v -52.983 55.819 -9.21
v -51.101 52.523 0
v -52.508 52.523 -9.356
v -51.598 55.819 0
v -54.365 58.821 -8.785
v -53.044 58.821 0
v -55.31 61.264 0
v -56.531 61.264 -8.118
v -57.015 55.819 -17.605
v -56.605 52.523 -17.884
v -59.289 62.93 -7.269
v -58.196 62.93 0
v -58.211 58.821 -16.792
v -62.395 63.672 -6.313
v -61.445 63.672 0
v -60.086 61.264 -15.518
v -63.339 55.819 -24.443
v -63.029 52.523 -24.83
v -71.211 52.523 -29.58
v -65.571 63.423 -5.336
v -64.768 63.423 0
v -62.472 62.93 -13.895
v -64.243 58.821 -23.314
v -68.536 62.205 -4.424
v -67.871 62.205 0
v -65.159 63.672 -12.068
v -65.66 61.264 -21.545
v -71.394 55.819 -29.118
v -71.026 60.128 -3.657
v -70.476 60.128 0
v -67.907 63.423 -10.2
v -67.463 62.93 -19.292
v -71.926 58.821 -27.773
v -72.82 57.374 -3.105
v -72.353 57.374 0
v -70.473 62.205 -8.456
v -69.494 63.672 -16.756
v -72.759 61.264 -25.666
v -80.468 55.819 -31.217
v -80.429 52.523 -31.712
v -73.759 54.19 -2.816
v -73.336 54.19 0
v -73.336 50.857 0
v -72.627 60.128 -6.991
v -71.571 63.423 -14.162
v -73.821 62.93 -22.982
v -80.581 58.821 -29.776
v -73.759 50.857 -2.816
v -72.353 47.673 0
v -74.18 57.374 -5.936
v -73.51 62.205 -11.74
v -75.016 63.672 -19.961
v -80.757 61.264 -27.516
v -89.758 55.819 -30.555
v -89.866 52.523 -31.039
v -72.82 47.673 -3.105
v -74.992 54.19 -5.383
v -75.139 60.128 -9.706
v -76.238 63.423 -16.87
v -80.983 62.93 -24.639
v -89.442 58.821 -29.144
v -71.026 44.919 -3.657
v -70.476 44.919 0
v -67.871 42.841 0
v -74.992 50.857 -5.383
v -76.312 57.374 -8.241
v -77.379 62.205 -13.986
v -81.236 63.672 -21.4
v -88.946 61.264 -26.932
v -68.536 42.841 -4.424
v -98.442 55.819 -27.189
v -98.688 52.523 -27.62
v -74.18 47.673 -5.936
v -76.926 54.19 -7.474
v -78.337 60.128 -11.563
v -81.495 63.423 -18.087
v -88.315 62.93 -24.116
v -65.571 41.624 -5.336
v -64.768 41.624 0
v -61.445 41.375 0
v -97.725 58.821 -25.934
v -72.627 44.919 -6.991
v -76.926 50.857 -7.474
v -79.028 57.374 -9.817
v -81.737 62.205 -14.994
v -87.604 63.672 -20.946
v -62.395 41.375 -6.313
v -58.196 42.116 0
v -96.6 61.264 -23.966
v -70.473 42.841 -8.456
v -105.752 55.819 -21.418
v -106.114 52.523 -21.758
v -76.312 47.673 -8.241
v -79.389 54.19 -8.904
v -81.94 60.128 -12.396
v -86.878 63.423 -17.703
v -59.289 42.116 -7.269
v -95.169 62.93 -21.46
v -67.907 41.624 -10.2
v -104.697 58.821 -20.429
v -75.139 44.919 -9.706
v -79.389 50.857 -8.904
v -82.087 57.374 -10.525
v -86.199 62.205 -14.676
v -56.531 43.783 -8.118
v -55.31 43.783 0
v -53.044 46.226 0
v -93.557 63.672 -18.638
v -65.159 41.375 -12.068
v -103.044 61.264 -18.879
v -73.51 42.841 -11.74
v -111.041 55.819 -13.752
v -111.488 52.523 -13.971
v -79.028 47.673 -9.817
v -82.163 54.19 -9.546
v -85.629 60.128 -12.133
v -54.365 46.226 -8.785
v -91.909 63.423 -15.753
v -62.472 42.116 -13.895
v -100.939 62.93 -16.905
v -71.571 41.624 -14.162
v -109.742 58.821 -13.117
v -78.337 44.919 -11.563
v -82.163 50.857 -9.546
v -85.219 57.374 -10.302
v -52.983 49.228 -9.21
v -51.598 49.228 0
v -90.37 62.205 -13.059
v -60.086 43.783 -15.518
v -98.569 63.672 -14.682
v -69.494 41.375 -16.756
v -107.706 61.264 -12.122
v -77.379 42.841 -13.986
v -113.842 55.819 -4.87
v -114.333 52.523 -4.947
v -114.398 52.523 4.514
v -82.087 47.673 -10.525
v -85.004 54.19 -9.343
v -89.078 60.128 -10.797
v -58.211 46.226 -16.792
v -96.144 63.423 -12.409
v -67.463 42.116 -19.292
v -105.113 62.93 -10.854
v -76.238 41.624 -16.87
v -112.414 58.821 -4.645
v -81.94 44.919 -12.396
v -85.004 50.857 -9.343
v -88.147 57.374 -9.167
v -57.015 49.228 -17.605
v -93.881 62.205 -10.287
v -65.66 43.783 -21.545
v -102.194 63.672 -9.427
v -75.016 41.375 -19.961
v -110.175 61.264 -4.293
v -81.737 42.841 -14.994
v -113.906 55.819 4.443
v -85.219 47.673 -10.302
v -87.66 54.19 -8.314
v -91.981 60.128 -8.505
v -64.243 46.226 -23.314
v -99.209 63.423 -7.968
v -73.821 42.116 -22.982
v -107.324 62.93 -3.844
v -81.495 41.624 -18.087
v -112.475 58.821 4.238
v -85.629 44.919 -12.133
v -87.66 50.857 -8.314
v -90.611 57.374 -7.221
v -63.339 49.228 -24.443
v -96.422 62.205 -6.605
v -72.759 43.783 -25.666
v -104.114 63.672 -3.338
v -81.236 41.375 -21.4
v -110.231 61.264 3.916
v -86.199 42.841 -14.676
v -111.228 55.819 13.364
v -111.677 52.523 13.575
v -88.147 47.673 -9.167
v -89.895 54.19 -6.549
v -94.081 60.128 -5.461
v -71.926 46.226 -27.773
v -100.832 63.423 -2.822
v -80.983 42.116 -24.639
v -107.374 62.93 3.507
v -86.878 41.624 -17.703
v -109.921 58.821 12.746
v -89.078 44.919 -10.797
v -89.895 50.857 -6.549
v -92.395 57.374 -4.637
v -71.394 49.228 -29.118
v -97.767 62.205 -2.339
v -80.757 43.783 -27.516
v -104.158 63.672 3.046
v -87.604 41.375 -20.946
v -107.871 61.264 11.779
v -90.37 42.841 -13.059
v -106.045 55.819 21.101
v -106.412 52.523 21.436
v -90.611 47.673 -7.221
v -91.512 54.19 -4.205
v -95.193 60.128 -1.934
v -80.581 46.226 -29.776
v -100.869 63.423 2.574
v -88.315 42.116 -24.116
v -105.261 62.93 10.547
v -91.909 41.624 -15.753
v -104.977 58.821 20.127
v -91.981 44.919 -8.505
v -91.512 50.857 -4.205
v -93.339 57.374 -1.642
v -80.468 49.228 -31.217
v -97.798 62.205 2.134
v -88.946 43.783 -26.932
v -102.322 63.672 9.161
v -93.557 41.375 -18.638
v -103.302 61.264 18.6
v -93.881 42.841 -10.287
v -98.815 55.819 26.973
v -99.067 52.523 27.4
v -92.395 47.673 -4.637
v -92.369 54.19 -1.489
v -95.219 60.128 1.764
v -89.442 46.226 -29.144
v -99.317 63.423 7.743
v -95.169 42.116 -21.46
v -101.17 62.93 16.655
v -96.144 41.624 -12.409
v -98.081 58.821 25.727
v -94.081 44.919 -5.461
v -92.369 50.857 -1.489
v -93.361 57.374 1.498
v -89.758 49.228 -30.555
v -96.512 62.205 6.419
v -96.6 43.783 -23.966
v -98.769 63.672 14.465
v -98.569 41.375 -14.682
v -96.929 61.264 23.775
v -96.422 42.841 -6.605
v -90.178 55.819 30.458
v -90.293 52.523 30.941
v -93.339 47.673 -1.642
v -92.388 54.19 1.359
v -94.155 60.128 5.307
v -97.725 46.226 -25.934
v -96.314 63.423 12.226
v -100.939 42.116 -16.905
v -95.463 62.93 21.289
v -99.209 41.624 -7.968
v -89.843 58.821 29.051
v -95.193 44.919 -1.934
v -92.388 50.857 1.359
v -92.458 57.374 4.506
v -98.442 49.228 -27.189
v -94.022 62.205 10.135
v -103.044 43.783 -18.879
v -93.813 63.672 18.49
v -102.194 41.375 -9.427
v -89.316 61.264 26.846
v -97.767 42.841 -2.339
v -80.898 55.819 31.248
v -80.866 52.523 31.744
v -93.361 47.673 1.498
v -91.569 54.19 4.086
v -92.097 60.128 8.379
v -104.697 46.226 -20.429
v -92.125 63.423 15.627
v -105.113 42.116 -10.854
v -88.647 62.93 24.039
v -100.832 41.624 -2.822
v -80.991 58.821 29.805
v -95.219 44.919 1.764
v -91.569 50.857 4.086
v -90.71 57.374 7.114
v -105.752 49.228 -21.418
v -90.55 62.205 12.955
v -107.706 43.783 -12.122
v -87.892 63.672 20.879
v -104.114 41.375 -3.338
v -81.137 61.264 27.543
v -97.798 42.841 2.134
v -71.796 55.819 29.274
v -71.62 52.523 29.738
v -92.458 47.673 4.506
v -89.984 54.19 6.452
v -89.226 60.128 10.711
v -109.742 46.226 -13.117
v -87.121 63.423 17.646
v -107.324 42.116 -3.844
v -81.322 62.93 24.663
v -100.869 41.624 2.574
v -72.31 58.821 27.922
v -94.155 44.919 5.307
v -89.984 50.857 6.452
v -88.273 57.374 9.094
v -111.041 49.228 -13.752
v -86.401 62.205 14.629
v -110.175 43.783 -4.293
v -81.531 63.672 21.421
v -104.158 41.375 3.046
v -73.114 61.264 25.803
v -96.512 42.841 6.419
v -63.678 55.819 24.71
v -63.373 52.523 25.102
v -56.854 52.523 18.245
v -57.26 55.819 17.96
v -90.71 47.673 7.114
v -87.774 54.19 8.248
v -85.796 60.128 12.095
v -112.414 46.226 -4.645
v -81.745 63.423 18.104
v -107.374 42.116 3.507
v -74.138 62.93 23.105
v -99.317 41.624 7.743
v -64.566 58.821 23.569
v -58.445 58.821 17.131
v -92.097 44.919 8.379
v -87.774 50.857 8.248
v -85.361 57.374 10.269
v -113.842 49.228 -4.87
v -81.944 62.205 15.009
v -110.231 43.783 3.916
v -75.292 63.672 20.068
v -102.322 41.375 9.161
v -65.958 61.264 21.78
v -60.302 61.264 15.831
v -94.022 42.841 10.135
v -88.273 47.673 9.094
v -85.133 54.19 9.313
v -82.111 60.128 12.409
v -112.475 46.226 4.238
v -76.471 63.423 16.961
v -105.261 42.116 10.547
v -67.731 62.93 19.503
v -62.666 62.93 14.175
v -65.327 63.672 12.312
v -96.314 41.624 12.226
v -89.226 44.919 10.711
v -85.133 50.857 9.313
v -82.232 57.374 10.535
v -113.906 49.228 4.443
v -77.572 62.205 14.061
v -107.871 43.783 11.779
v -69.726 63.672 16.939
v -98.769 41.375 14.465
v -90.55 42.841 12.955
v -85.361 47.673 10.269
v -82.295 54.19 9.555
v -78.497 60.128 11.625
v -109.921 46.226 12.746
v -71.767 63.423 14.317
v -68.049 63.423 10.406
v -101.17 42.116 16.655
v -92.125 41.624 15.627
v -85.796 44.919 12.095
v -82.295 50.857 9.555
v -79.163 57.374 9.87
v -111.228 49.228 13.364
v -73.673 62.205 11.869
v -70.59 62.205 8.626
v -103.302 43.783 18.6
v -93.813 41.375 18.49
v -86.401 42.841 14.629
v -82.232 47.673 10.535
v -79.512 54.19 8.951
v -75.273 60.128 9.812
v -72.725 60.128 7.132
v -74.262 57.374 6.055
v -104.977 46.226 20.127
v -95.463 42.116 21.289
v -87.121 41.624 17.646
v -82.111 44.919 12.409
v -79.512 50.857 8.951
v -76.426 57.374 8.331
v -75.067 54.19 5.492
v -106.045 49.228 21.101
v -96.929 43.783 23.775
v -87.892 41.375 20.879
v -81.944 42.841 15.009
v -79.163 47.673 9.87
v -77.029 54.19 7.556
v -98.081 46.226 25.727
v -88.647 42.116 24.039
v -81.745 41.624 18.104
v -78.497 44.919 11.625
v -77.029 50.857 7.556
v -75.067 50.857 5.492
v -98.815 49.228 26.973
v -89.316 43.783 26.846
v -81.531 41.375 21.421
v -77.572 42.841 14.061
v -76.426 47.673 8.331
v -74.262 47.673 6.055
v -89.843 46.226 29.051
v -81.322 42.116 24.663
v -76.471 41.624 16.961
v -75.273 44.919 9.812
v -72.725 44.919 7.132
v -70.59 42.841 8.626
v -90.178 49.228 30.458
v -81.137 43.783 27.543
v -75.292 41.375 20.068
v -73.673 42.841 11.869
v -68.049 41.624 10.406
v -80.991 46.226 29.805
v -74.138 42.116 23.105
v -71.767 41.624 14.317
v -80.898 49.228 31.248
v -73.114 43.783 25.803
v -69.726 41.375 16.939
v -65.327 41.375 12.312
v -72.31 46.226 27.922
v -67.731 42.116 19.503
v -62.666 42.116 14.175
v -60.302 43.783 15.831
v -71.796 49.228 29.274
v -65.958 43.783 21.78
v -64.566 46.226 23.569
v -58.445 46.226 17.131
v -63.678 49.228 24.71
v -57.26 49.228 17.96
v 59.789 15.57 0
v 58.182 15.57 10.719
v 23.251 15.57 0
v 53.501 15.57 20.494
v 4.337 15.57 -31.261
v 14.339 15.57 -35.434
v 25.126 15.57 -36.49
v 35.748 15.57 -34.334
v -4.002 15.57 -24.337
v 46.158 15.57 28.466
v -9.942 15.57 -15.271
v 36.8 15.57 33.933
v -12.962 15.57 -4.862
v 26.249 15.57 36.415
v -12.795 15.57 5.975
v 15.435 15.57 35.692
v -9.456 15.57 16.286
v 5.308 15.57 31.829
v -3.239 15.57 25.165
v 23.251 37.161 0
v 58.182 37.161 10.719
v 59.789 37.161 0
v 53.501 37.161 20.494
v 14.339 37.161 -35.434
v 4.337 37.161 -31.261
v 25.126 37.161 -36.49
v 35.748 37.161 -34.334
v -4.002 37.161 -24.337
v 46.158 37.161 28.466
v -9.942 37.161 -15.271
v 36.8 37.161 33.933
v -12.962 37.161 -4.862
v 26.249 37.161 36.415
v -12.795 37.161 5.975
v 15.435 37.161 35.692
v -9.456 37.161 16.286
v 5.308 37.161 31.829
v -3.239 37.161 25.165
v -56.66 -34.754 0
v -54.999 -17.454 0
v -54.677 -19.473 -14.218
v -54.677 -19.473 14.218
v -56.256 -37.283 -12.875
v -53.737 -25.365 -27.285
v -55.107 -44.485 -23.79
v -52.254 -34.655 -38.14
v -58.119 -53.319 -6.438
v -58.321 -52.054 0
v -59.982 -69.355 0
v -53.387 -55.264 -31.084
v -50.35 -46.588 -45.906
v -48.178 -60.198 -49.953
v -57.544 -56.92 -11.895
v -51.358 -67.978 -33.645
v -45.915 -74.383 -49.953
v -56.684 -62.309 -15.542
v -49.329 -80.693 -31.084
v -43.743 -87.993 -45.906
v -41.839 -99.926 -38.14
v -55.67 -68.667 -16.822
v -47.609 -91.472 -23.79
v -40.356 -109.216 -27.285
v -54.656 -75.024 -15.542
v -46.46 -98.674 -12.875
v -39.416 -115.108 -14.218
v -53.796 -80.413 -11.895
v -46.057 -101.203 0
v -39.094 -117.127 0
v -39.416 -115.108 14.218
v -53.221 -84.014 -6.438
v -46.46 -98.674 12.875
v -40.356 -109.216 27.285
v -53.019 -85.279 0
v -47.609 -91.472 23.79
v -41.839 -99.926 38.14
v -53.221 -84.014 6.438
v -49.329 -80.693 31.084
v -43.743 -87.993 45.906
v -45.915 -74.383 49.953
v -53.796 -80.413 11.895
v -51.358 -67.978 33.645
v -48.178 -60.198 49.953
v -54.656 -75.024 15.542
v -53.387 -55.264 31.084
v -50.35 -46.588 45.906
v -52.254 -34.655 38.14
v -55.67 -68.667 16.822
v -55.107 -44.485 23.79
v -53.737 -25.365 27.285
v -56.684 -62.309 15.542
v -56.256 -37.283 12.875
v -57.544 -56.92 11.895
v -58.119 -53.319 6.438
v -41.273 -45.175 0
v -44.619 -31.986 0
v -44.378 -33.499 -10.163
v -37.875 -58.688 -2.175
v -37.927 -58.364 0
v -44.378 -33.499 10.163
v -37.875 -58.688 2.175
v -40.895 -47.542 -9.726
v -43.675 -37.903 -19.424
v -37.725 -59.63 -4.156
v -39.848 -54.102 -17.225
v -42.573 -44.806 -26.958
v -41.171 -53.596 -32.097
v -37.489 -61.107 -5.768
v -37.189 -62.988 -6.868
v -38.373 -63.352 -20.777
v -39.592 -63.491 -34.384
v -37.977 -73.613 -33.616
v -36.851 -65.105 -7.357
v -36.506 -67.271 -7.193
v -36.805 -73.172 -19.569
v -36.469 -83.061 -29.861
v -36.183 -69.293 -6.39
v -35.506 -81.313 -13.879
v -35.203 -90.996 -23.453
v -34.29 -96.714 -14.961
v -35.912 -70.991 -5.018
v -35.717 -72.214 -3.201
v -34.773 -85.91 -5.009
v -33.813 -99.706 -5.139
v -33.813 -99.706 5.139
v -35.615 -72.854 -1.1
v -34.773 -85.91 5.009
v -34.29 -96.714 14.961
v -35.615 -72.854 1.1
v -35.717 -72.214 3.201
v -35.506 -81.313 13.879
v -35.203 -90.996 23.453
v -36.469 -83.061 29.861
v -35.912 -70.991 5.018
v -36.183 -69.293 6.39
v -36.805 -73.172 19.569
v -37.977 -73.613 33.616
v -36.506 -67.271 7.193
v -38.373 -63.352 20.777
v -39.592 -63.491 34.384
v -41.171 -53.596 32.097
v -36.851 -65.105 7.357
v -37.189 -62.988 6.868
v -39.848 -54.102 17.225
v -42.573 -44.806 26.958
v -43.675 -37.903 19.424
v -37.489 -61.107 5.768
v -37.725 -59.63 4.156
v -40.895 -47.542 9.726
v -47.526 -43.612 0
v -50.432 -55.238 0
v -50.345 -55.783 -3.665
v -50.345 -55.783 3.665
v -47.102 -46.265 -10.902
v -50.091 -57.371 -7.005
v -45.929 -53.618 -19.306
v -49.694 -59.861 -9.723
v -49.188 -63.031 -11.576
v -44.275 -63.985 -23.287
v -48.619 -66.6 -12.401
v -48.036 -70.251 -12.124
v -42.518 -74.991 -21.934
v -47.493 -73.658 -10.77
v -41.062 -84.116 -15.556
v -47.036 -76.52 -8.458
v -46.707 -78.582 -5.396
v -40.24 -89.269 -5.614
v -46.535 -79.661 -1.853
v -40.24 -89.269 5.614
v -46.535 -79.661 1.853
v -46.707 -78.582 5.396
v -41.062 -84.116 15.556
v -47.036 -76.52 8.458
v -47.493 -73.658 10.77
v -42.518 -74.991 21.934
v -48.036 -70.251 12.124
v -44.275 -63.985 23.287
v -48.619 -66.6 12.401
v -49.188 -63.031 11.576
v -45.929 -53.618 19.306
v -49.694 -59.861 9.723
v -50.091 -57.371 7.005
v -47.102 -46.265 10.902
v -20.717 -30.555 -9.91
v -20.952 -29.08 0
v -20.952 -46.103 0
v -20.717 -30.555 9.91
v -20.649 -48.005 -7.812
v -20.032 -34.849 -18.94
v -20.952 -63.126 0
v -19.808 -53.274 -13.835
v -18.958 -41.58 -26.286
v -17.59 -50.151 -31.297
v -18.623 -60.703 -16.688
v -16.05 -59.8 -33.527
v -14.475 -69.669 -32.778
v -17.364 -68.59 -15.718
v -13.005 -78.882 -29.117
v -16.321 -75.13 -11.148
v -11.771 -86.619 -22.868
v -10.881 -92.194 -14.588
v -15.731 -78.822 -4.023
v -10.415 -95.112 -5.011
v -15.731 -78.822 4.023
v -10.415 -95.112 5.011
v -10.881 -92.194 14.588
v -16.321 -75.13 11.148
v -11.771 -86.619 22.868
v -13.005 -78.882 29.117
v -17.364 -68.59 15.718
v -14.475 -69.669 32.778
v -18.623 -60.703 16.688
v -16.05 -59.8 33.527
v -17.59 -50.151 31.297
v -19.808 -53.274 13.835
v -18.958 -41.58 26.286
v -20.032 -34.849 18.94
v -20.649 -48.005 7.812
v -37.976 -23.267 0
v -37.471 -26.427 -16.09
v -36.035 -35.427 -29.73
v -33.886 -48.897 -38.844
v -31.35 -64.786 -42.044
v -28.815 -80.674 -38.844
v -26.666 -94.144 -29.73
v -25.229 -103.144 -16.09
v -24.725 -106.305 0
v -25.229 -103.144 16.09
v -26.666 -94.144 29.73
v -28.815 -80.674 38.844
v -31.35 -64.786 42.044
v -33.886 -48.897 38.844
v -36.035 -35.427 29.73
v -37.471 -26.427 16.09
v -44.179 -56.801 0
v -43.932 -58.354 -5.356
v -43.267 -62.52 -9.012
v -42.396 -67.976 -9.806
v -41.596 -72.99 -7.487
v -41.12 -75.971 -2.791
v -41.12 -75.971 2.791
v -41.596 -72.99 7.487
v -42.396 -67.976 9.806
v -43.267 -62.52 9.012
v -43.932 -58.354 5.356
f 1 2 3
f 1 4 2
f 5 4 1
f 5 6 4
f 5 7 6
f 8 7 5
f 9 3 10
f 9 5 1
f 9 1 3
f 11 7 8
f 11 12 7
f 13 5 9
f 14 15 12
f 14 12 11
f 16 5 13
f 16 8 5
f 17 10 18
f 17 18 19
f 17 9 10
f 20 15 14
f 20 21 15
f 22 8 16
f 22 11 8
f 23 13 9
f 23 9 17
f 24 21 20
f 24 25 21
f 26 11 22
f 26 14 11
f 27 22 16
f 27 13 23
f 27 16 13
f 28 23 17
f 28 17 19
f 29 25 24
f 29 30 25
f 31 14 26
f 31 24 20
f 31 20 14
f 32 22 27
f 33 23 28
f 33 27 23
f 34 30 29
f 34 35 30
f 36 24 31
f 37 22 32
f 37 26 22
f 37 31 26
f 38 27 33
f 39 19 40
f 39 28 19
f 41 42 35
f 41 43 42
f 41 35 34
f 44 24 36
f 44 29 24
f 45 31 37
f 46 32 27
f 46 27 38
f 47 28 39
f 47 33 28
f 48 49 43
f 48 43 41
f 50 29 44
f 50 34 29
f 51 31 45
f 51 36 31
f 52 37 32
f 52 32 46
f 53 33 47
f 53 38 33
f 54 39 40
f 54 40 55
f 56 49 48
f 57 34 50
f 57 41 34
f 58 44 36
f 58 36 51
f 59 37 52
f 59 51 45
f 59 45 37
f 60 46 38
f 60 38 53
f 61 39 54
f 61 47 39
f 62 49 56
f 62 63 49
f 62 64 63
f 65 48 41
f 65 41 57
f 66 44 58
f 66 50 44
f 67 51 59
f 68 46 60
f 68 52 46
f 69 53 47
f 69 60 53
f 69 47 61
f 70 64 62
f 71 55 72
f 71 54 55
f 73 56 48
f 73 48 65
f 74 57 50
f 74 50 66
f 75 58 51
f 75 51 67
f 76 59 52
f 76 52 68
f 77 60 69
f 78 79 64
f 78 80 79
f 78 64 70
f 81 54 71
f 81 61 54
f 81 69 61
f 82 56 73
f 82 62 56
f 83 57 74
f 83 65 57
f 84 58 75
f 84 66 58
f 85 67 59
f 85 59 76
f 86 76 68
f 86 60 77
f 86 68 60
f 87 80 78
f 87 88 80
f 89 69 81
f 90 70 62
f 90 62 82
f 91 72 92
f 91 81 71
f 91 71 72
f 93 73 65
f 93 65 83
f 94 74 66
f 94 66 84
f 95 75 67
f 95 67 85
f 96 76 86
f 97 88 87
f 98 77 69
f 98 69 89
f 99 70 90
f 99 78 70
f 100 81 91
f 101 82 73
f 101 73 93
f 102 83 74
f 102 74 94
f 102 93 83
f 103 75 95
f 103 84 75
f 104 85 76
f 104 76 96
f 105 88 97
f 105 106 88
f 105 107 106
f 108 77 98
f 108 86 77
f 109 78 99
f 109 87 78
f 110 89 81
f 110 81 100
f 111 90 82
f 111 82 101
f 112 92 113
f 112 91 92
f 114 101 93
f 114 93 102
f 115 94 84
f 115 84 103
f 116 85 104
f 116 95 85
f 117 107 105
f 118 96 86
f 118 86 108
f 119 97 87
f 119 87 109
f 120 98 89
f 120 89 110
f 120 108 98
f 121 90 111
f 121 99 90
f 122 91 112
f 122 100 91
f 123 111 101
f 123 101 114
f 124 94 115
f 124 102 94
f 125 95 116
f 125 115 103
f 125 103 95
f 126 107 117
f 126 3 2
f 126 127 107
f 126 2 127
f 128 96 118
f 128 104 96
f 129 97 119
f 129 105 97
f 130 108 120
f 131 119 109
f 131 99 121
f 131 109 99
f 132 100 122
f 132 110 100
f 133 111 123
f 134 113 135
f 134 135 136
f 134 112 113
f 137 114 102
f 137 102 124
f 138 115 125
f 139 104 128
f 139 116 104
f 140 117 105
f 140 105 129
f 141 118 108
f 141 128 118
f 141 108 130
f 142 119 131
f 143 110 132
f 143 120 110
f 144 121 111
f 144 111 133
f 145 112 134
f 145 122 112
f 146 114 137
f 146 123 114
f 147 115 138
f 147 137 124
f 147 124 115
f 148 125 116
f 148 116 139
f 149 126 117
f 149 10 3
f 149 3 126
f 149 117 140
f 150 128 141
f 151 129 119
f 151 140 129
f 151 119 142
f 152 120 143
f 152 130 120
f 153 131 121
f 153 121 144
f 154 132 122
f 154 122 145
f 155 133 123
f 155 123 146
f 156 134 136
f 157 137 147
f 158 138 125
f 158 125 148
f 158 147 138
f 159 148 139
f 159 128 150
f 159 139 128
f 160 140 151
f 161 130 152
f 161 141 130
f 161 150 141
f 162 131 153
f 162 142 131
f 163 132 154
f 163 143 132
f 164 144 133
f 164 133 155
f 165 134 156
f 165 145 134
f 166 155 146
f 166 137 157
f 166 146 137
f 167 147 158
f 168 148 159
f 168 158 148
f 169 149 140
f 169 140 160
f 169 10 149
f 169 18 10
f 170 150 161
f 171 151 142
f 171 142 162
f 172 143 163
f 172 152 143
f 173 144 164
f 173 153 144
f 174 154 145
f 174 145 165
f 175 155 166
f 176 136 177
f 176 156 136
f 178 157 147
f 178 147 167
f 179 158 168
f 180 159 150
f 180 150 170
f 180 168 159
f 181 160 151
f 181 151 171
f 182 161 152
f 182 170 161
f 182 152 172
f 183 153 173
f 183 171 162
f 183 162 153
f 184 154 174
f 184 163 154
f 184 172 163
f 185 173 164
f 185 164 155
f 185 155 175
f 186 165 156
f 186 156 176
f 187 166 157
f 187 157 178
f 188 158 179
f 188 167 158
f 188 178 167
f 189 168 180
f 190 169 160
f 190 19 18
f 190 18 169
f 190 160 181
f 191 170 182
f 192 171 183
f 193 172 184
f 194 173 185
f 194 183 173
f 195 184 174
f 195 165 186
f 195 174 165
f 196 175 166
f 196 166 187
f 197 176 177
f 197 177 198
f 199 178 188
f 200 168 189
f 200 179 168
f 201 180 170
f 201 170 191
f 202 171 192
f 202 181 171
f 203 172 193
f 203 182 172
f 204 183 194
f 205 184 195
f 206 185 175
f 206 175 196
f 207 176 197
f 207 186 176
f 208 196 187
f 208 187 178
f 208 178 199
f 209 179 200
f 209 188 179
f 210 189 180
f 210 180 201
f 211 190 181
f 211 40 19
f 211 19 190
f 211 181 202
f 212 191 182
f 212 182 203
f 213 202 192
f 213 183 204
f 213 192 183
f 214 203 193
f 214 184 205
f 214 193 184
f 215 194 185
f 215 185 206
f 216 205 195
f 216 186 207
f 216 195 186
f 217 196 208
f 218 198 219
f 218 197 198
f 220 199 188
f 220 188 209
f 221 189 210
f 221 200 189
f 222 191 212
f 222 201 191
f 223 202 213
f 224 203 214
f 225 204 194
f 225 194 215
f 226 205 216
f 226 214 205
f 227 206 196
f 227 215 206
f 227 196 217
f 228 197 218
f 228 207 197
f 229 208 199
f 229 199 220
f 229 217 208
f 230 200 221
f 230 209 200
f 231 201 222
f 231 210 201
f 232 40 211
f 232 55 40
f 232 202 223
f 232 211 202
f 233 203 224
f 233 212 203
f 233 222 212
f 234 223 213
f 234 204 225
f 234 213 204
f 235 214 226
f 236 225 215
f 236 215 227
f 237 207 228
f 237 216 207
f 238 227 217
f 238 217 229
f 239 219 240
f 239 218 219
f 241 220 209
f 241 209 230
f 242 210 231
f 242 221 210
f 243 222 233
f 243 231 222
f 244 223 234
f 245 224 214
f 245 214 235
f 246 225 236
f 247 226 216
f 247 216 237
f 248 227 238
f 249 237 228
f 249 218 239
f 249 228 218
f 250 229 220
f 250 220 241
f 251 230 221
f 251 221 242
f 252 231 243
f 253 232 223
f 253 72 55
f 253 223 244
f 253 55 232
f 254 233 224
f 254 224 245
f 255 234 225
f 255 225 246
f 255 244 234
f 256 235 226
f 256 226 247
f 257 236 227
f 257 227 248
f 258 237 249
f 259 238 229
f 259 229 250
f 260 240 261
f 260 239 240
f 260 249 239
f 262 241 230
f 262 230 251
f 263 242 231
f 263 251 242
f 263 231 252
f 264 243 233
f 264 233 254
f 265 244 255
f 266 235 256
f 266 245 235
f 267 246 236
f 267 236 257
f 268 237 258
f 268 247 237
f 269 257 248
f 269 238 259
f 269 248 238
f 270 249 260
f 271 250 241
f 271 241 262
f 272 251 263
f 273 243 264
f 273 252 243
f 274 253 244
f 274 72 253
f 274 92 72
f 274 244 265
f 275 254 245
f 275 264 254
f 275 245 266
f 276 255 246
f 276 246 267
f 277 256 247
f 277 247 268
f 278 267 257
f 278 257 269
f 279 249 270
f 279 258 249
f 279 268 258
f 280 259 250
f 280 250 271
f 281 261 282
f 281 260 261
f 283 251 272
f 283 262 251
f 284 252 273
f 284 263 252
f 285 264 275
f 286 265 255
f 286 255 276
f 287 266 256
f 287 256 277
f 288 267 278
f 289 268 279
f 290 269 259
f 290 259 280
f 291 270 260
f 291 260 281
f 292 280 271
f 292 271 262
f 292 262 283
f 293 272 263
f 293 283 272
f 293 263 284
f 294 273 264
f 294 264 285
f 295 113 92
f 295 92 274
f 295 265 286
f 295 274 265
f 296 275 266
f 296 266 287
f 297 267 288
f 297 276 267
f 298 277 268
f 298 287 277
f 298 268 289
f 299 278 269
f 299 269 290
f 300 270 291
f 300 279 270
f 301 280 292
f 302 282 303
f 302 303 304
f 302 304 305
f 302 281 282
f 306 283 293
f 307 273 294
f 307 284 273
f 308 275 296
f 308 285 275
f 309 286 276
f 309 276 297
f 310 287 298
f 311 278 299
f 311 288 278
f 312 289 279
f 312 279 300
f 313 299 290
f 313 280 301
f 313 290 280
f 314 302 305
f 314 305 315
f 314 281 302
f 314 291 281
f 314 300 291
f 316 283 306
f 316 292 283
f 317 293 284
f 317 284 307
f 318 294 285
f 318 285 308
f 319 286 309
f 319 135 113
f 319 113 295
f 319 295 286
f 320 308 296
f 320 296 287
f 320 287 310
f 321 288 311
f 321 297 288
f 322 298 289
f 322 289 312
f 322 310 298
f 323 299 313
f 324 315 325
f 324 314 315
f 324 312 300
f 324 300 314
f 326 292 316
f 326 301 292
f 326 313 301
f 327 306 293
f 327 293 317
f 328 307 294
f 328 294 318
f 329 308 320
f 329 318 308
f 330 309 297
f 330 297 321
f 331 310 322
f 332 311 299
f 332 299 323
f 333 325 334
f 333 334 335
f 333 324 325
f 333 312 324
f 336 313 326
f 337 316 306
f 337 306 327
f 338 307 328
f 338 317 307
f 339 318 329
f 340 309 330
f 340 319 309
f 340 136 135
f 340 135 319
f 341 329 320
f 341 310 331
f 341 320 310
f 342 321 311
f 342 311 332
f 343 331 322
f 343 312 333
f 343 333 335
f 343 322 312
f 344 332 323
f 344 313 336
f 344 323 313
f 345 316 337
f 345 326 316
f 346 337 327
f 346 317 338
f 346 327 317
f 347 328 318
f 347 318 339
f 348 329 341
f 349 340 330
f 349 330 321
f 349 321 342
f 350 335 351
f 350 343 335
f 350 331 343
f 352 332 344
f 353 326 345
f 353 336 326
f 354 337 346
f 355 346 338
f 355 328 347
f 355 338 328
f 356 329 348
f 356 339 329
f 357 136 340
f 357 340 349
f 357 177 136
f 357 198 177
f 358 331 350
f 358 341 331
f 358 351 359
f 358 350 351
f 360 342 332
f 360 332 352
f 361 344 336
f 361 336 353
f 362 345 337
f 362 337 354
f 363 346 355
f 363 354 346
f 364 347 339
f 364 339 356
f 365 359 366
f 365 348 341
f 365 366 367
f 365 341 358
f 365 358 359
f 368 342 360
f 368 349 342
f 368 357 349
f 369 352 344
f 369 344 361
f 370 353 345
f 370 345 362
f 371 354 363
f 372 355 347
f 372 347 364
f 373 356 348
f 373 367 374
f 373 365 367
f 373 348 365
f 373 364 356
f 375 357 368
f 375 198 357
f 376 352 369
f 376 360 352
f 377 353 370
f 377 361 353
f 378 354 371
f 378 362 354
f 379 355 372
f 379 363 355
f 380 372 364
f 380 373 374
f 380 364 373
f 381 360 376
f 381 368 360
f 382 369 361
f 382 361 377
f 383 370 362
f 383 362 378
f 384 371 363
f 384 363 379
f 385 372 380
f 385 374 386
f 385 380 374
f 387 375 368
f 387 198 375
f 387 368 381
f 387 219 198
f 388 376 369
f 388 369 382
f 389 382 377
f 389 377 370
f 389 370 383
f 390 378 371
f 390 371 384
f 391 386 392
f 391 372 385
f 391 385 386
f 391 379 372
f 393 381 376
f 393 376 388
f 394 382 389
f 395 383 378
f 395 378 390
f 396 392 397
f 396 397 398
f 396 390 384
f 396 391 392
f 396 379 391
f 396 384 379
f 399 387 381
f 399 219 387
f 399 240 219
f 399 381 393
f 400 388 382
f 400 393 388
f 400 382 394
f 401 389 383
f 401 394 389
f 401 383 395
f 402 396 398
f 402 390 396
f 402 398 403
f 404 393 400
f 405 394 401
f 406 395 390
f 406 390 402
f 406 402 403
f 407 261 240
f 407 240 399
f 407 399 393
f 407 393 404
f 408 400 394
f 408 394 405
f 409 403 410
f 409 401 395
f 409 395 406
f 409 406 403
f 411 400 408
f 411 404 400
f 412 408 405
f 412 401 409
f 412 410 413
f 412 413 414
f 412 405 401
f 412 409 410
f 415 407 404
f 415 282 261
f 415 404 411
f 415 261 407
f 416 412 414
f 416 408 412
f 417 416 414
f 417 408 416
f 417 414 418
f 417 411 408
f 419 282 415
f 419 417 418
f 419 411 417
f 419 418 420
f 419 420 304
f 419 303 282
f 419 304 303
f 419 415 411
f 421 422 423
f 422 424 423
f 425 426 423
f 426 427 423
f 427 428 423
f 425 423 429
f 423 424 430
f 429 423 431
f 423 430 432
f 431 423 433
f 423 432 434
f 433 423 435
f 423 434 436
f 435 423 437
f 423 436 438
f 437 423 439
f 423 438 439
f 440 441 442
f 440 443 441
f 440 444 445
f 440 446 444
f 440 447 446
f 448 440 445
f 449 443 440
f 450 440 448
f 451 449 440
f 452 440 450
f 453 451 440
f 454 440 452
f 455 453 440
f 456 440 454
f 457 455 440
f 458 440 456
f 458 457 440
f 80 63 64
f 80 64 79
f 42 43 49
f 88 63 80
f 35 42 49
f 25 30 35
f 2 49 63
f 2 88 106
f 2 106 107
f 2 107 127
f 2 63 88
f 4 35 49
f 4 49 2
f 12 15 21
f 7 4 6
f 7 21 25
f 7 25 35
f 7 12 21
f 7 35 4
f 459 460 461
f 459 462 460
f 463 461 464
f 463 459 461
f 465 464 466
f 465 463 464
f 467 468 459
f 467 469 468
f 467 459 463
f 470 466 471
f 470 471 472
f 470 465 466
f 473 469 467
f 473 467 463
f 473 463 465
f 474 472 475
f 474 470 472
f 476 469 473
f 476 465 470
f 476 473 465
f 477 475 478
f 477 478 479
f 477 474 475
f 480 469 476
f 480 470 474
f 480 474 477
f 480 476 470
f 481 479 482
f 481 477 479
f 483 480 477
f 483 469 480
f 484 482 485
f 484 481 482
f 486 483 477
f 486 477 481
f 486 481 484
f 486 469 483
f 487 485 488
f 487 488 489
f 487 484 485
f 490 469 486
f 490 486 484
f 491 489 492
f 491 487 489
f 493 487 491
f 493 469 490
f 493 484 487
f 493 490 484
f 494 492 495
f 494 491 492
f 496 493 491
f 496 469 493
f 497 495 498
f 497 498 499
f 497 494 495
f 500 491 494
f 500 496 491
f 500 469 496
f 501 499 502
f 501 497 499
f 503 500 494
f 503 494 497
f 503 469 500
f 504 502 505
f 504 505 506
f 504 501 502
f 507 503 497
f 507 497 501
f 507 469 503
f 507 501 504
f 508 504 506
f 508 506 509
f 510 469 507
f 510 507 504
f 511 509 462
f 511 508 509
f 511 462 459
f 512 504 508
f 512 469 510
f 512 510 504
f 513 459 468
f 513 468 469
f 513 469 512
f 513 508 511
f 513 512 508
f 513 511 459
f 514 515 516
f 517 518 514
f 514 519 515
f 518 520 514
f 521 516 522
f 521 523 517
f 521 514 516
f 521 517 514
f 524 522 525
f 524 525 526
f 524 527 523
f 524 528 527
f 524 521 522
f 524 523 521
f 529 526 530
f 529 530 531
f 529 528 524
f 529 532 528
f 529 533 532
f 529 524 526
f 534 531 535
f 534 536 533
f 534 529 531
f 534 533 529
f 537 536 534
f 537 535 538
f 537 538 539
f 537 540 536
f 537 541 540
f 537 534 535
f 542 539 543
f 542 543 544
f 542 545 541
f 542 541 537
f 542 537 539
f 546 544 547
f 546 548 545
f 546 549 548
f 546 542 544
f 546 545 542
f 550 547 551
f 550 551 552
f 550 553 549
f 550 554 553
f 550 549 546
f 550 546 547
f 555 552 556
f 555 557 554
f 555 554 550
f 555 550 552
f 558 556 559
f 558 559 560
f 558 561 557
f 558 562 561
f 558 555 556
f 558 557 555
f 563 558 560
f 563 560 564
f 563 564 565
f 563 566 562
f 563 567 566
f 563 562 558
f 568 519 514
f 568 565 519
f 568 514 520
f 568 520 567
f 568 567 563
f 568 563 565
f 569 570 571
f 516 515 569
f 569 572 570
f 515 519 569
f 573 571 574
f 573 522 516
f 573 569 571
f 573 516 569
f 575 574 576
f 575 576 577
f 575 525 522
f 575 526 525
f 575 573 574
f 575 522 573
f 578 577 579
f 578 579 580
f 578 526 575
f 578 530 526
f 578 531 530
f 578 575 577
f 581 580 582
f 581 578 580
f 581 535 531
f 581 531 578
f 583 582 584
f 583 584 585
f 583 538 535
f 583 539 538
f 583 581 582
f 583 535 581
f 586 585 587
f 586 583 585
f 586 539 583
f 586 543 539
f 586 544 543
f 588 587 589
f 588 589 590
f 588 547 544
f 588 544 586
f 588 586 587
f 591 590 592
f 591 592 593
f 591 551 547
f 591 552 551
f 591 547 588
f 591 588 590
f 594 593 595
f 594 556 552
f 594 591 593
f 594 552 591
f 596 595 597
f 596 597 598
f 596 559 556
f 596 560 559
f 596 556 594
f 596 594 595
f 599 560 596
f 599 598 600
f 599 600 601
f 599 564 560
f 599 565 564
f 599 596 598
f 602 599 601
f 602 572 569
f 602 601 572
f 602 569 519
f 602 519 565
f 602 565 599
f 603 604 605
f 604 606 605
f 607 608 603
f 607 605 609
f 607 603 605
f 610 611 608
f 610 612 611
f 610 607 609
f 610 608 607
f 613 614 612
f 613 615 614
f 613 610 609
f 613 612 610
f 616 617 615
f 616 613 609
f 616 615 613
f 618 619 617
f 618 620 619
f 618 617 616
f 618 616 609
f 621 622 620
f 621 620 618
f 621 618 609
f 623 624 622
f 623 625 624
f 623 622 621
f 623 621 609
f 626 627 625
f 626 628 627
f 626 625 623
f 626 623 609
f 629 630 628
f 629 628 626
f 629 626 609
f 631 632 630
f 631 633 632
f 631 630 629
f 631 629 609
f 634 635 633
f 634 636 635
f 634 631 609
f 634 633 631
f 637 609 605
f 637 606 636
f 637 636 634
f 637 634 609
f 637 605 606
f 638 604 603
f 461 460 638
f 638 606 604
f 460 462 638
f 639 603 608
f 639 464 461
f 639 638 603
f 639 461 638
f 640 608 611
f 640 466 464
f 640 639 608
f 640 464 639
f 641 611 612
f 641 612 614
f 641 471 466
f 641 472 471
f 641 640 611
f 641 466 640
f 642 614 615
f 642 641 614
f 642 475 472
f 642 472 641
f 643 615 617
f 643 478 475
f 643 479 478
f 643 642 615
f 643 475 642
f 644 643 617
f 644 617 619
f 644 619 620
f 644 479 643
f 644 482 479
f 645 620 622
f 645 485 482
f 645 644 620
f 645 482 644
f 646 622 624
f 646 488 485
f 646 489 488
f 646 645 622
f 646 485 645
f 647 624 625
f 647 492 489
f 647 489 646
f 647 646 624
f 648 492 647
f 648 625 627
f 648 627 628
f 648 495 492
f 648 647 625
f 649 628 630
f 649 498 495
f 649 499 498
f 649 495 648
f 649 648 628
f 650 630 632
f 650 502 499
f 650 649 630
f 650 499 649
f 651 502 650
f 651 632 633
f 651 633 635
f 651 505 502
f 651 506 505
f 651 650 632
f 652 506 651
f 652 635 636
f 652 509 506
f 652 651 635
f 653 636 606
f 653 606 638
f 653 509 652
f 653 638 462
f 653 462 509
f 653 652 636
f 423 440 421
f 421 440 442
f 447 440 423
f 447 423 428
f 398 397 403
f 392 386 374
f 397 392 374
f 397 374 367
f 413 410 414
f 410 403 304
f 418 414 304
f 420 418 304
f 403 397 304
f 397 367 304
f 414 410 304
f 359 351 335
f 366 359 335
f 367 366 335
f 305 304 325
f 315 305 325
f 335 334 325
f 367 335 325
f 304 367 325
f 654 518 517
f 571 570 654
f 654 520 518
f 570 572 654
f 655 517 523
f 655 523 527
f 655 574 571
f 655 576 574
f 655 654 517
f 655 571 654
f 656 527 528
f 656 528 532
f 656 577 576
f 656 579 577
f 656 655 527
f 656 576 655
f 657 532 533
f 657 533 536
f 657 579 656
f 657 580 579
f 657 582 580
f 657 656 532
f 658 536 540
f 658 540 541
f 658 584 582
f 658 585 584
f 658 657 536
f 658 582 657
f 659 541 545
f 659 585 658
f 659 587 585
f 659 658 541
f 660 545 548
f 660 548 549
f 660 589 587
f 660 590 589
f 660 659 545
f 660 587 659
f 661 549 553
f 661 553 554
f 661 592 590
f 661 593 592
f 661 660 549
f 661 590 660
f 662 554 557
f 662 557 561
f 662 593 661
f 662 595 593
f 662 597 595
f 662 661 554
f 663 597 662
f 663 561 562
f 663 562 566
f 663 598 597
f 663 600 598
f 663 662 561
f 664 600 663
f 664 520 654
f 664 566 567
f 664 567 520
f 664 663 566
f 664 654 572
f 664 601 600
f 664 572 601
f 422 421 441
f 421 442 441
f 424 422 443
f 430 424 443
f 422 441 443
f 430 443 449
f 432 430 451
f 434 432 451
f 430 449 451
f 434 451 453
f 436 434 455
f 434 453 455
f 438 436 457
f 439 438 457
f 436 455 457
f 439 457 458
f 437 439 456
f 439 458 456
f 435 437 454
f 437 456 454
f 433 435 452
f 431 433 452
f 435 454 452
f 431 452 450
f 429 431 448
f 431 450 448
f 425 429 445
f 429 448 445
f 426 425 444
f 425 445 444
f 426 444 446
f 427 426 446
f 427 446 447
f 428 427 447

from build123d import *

# Parameters (mm, degrees)
F0_R     = 11.1797222355
F1_ANGLE = 325
F0_W     = 36.5379918367
F0_H     = 21.5906333178
F2_ANGLE = 290


with BuildPart() as f1:
    # F0 (on Top) → F1 (revolve)
    with BuildSketch(Plane.XY):
        with Locations((-62.280677259, 52.5233596563)):
            Circle(F0_R)
    revolve(axis=Axis((-82.9103291035, 50.9820729494, 0), (0, 1, 0)), revolution_arc=F1_ANGLE)


with BuildPart() as f2:
    # F0 (on Top) → F2 (revolve)
    with BuildSketch(Plane.XY):
        with Locations((41.5204456076, 26.3654785231)):
            Rectangle(F0_W, F0_H)
    revolve(axis=Axis((23.2514496893, 26.3654785231, 0), (0, -1, 0)), revolution_arc=F2_ANGLE)


with BuildPart() as f3:
    # F0 (on Top) → F3 (revolve)
    with BuildSketch(Plane.XY):
        Polygon((-20.9524314851, -29.0797241032), (-54.9991987646, -17.4539964646), (-59.9816553295, -69.3545565009), (-20.9524314851, -63.1264895201), align=None)
        Polygon((-50.4319518805, -55.2375987172), (-44.6190871298, -31.9861508906), (-37.9269696142, -58.3638457864), align=None, mode=Mode.SUBTRACT)
    revolve(axis=Axis((-40.4670434073, -66.2405230105, 0), (-0.9875061057, -0.157580745, 0)))


solid = Compound([f1.part, f2.part, f3.part])
